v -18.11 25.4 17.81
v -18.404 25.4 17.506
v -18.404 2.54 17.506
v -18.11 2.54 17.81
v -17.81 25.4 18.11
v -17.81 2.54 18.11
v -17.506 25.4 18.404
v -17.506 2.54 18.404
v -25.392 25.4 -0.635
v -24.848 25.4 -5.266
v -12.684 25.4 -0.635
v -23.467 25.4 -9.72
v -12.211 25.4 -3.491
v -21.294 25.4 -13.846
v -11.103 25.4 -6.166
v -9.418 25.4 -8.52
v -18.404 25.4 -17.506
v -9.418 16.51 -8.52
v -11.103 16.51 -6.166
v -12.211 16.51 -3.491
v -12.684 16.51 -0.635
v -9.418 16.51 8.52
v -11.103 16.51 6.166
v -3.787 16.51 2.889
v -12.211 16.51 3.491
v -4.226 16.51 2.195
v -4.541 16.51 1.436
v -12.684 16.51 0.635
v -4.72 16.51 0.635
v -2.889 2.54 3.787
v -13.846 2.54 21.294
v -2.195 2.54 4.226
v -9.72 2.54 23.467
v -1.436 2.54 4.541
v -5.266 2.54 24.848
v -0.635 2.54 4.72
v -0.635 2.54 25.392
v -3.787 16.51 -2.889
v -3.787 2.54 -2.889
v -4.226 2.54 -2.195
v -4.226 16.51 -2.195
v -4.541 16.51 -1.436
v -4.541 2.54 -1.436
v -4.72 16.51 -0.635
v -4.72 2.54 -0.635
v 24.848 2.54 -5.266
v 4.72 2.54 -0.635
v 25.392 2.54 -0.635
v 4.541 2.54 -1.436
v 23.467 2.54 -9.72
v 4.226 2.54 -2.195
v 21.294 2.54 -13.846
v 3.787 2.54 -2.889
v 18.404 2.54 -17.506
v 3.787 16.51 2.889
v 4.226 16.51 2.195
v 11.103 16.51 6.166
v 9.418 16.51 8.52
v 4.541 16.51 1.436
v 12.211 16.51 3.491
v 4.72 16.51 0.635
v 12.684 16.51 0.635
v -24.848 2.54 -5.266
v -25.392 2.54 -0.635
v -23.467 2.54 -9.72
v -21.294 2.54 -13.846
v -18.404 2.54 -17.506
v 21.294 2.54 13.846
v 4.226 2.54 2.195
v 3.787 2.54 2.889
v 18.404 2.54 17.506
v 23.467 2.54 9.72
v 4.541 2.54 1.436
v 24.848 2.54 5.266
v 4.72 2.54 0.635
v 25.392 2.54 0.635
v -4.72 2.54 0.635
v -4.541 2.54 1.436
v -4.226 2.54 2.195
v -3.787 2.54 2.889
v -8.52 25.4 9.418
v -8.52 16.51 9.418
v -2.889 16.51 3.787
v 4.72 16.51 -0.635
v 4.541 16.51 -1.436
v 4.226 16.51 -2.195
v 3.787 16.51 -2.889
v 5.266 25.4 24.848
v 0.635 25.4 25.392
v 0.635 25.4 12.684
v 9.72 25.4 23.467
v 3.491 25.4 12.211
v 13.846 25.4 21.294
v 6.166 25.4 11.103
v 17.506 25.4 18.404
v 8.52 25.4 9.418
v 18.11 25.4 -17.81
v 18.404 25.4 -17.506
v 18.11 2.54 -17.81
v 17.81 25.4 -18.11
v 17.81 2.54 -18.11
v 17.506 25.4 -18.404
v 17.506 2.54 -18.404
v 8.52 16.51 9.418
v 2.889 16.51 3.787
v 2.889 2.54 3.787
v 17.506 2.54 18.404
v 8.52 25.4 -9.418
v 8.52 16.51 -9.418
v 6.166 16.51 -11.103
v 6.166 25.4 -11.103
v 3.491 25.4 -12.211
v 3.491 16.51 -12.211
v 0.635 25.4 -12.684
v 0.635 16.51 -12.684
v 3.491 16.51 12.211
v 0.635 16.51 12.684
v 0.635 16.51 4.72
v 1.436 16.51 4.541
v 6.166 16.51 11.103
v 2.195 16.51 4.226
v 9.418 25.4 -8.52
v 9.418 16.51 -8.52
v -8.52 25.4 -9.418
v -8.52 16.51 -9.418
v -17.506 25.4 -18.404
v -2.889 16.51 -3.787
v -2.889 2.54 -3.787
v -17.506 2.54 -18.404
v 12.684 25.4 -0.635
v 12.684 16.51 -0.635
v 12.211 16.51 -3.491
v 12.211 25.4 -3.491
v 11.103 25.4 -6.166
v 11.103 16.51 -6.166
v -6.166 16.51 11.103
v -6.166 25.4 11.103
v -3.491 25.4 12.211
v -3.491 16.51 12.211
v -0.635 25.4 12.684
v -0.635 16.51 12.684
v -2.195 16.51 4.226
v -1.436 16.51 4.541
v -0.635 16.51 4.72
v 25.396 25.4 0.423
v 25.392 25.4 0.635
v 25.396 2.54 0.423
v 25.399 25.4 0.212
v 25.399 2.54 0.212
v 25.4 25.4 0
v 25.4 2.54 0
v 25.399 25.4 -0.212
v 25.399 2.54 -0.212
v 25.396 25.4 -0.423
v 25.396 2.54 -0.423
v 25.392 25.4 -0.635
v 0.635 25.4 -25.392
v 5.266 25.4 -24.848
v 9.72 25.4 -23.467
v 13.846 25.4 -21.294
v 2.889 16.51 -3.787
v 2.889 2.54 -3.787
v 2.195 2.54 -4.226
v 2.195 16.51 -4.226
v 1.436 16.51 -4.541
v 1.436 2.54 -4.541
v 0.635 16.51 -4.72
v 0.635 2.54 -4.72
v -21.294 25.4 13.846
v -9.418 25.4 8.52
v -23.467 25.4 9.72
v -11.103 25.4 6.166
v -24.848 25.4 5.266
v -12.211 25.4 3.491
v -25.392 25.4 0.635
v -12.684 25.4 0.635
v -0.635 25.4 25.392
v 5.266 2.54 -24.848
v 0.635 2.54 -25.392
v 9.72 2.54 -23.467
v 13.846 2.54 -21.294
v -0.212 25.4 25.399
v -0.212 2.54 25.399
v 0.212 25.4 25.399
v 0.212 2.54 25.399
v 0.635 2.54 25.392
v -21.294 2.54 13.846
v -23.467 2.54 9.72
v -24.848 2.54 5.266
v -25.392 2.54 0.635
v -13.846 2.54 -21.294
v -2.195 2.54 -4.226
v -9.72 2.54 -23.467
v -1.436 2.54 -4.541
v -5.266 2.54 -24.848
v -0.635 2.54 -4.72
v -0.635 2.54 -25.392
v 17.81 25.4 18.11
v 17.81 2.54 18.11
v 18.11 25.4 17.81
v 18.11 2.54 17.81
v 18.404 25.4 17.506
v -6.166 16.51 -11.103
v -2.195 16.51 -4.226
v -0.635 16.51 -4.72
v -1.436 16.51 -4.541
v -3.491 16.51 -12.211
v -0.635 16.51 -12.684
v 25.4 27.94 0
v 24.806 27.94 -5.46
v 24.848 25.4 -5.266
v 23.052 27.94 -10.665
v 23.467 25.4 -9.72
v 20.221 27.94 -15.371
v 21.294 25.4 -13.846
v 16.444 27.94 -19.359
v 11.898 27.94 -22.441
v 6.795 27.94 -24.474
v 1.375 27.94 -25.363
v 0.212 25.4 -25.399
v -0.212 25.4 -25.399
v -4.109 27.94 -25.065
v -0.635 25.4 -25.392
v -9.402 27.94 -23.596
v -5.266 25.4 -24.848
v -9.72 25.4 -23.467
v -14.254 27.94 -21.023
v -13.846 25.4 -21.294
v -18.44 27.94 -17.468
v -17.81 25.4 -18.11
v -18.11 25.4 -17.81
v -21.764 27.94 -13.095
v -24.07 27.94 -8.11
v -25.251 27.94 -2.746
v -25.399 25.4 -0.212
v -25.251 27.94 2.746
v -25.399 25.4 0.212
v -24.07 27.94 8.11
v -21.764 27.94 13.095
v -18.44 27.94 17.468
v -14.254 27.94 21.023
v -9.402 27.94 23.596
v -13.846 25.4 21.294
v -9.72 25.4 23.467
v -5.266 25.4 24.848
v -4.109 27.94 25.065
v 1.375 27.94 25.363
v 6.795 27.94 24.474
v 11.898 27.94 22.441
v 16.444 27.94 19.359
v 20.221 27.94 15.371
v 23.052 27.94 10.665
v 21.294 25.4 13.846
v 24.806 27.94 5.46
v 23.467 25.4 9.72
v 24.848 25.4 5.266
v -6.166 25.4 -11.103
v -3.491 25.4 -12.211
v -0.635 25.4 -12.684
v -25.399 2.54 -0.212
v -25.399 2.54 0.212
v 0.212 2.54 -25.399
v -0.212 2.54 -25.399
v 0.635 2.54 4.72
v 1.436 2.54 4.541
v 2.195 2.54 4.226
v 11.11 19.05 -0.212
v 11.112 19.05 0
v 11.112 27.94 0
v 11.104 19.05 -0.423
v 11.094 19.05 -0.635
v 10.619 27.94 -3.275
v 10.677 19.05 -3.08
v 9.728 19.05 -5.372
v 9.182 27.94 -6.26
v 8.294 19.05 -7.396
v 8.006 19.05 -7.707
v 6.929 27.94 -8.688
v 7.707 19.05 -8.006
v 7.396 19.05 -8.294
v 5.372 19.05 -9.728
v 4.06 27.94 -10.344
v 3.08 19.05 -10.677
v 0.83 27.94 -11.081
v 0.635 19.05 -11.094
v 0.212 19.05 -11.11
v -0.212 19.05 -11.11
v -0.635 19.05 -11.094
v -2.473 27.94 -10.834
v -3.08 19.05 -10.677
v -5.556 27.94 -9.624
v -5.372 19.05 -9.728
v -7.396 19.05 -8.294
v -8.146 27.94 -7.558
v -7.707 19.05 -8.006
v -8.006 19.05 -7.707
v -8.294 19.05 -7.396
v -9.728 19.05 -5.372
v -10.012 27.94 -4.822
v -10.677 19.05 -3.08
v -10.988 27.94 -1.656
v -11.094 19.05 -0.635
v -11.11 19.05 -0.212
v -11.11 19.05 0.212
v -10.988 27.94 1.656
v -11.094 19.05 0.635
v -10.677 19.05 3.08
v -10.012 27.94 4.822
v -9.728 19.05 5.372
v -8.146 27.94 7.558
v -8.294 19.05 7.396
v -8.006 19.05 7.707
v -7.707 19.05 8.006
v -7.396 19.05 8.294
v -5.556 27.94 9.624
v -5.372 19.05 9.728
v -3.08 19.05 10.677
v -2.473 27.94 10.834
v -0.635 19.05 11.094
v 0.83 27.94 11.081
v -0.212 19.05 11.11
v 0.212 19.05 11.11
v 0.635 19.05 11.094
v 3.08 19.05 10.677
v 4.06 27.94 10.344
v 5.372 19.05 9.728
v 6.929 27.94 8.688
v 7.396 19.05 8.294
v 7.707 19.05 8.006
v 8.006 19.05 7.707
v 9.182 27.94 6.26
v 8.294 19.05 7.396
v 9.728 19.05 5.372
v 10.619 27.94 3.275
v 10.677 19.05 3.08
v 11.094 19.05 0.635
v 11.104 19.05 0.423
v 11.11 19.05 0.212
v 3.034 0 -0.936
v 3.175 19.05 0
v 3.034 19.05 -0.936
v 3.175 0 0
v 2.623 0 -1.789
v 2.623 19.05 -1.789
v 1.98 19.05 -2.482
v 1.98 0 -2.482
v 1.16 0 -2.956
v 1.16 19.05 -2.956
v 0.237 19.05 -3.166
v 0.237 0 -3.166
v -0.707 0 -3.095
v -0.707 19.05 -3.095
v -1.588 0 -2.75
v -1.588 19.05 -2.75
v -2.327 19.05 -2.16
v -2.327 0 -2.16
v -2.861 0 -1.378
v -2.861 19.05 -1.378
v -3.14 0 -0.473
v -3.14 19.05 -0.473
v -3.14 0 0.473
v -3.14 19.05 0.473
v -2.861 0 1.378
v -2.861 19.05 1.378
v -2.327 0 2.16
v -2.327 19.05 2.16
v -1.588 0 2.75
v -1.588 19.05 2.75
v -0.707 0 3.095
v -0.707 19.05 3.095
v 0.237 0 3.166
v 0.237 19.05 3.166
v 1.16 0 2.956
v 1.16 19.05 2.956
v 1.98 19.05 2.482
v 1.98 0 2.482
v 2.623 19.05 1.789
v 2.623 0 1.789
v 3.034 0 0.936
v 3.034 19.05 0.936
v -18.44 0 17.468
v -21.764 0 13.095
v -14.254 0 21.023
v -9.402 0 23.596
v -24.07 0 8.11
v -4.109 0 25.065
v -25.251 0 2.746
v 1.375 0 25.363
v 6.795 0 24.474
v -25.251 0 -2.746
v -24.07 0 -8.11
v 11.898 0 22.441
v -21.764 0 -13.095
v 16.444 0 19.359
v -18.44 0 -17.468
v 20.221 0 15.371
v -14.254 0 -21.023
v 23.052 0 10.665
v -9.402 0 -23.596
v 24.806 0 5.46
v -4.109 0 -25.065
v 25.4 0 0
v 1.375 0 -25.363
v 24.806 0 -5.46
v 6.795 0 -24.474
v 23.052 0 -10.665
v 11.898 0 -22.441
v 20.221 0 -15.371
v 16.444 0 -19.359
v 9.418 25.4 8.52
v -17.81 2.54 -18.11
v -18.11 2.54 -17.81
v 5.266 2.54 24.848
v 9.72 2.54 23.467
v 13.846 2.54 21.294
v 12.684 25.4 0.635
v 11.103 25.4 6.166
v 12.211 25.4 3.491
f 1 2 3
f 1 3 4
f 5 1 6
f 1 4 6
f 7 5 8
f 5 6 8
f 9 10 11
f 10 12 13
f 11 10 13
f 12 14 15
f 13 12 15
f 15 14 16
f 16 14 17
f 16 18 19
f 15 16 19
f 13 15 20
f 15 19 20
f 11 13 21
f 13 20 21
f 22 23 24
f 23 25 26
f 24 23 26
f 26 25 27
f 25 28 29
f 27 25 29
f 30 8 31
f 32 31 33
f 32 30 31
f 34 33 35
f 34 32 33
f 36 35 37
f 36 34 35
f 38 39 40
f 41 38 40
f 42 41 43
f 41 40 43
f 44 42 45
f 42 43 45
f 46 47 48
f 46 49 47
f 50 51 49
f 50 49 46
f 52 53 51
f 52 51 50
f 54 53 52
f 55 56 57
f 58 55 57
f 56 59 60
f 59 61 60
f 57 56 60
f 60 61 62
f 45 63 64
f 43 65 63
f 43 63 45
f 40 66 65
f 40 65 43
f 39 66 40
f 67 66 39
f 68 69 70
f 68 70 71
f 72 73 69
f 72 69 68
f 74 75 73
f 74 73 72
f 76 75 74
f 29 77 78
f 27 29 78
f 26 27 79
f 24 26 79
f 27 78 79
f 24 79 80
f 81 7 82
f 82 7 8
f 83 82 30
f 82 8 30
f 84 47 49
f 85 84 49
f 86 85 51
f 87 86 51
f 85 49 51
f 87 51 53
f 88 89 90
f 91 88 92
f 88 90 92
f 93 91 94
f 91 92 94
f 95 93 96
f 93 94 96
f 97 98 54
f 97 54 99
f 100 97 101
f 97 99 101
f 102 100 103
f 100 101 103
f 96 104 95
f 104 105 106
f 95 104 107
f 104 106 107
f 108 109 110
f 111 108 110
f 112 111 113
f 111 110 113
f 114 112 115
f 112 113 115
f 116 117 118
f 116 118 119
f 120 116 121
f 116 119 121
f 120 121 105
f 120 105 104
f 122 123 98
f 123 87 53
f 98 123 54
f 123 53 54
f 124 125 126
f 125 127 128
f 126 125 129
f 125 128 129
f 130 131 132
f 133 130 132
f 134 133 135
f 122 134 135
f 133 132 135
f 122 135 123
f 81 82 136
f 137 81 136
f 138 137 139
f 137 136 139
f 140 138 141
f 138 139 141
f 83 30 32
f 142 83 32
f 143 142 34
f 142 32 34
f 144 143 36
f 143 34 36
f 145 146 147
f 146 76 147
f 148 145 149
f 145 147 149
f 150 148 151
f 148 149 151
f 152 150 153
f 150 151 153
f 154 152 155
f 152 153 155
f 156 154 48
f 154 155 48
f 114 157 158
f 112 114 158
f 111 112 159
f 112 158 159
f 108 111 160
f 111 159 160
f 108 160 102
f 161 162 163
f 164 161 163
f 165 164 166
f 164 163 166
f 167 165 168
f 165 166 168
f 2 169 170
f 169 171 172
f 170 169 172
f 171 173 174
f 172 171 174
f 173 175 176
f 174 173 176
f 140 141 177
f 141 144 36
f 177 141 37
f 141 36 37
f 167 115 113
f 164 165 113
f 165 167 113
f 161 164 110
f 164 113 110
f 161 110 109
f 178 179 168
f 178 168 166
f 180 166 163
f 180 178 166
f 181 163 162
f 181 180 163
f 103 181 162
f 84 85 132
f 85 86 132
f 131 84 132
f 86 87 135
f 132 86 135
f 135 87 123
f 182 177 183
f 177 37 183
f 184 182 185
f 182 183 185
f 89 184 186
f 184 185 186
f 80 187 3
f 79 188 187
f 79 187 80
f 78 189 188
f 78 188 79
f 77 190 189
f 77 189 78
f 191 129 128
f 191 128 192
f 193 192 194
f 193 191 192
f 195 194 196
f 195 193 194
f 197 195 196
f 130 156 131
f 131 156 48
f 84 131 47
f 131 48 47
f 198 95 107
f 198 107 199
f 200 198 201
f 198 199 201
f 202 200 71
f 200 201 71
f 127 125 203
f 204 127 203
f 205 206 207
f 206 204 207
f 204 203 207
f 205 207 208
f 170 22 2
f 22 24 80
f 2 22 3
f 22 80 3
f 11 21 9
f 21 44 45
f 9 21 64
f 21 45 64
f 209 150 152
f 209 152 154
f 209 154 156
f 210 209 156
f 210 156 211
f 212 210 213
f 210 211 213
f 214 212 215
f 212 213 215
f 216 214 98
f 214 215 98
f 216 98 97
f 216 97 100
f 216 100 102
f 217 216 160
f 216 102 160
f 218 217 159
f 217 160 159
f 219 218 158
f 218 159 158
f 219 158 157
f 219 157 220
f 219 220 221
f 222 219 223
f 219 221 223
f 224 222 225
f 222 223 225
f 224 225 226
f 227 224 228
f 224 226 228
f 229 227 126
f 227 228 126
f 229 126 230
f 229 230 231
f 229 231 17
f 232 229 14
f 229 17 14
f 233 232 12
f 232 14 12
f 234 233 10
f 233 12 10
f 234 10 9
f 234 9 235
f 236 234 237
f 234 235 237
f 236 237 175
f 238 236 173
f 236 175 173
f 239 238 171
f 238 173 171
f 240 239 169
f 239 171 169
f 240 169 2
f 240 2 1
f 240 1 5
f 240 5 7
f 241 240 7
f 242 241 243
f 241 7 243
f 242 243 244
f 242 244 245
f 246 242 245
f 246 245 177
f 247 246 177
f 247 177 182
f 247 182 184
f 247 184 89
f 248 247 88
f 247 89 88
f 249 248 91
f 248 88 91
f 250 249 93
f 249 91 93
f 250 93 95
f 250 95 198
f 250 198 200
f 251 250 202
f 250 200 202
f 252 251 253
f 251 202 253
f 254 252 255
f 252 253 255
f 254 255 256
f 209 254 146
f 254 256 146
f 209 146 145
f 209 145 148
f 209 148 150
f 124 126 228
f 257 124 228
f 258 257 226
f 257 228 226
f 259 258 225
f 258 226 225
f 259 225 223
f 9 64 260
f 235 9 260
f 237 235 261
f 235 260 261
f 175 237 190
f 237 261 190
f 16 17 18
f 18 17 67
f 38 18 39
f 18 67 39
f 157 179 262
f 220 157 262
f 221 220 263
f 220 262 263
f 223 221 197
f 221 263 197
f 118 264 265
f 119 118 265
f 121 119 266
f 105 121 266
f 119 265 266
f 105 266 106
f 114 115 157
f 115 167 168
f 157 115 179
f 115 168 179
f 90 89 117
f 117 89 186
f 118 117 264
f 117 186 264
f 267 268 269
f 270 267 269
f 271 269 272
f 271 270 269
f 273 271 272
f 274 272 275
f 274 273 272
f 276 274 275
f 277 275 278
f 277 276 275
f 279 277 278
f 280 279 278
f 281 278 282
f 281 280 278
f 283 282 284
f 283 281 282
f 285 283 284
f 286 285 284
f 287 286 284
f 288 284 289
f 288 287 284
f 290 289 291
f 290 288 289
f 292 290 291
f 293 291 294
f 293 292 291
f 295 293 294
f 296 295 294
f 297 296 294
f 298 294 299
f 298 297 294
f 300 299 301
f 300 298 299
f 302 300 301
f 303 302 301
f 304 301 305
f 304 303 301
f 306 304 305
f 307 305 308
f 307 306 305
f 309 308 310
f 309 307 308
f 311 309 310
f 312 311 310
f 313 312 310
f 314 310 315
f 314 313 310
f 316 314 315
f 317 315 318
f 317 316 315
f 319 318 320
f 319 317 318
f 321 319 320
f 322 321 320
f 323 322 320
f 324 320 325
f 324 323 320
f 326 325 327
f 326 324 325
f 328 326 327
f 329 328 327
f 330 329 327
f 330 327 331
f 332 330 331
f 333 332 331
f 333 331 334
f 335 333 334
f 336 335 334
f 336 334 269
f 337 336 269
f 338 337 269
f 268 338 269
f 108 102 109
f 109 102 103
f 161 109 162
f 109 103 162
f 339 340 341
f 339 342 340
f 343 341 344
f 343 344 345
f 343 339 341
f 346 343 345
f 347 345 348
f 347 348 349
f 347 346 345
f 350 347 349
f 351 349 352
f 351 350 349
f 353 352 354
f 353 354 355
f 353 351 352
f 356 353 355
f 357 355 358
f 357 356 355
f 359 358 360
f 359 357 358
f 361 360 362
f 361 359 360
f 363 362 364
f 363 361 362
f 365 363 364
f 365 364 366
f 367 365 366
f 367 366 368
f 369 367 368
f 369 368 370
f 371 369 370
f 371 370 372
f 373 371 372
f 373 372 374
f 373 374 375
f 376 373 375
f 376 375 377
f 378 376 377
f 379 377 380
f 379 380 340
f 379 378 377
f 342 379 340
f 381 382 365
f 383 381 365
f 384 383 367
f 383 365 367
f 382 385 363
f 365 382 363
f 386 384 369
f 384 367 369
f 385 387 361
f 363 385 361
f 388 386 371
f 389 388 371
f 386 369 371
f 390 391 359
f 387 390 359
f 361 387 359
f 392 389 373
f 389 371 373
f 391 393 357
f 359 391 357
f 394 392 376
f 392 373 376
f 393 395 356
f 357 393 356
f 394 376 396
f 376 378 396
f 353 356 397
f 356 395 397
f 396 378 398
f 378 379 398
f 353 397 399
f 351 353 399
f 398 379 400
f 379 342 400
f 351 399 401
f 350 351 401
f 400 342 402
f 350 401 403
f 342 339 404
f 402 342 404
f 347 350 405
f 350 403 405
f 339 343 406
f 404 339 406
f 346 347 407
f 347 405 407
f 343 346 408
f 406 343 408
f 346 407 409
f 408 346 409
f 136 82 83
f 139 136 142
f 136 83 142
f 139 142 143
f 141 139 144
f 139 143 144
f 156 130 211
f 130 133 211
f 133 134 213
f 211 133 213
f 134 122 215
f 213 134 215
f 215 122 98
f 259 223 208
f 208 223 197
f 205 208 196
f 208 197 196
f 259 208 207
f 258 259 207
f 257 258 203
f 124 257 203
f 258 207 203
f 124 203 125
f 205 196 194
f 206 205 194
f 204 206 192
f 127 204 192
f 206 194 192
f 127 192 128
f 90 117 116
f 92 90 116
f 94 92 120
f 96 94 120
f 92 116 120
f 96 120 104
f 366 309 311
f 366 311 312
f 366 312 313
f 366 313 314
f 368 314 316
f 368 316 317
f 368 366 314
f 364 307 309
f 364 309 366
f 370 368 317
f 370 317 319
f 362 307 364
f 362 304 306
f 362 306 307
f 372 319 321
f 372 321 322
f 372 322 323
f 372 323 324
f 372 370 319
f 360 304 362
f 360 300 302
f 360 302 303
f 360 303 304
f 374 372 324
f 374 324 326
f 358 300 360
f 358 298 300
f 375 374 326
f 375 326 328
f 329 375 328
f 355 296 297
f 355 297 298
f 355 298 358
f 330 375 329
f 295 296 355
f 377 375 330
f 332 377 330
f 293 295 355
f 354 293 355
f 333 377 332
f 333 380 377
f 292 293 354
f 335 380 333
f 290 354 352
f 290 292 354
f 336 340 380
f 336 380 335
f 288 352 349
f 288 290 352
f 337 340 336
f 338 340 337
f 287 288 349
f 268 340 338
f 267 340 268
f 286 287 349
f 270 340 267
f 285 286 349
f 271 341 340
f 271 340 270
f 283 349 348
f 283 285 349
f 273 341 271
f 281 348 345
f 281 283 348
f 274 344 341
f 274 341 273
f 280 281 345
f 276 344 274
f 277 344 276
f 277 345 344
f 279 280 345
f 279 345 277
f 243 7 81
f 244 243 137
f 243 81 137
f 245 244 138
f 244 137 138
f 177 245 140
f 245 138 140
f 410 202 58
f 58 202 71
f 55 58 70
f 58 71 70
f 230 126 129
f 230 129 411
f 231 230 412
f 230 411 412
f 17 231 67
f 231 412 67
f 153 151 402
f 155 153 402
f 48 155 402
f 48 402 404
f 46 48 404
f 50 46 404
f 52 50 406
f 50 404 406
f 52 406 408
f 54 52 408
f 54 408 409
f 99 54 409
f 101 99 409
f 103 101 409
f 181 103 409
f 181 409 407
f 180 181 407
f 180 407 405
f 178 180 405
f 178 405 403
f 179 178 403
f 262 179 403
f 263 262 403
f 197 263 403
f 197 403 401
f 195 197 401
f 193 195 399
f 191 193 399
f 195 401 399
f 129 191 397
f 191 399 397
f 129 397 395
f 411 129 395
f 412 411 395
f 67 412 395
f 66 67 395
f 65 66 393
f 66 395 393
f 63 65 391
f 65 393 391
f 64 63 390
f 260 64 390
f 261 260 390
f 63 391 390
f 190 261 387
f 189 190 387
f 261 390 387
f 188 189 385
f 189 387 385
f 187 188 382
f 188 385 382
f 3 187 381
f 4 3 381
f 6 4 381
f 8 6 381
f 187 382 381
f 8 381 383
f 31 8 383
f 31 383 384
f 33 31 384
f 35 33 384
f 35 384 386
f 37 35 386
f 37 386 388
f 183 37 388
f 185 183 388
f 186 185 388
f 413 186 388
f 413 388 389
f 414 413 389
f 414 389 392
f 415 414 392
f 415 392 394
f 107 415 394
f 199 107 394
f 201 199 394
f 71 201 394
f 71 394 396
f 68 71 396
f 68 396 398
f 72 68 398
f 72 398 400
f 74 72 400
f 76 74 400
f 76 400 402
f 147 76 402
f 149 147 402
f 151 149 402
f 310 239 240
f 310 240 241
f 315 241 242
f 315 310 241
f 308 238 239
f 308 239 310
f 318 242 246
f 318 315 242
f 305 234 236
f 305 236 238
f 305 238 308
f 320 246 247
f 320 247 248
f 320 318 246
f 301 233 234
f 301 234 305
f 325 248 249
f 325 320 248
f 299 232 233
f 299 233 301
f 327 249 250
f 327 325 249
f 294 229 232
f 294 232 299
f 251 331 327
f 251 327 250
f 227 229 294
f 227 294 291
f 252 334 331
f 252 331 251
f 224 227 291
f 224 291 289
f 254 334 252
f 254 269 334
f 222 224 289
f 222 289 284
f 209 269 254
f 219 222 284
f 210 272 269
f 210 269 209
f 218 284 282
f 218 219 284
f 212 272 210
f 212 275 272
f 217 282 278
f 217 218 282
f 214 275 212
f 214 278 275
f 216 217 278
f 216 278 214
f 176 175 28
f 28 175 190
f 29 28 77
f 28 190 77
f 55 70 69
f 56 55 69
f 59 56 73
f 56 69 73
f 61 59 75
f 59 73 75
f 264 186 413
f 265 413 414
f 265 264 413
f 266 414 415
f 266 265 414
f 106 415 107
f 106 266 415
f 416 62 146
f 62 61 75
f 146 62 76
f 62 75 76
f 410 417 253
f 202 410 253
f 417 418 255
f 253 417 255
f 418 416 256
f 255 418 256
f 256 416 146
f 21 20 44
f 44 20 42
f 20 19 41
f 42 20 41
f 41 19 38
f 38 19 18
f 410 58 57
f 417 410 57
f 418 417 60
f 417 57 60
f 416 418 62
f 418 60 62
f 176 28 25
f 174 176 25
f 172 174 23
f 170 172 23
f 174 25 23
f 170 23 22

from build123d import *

# Parameters (mm, degrees)
SKETCH1_R           = 25.4
SKETCH1_R_2         = 3.175
BOSS_EXTRUDE1_DEPTH = 2.54
SKETCH2_R           = 3.175
BOSS_EXTRUDE4_DEPTH = 13.97
SKETCH5_R           = 11.1125
SKETCH5_R_2         = 3.175
BOSS_EXTRUDE6_DEPTH = 2.54
SKETCH5_4_R         = 11.1125
BOSS_EXTRUDE7_DEPTH = 8.89
SKETCH6_R           = 25.4
SKETCH6_R_2         = 11.1125
BOSS_EXTRUDE8_DEPTH = 2.54


with BuildPart() as part:
    # Sketch1 → Boss-Extrude1 (new body)
    with BuildSketch(Plane(origin=(0, 0, 0), x_dir=(1, 0, 0), z_dir=(0, 1, 0))):
        Circle(SKETCH1_R)
        Circle(SKETCH1_R_2, mode=Mode.SUBTRACT)
    extrude(amount=BOSS_EXTRUDE1_DEPTH)

    # Sketch2 → Boss-Extrude4 (add)
    with BuildSketch(Plane(origin=(0, 2.54, 0), x_dir=(1, 0, 0), z_dir=(0, 1, 0))):
        with BuildLine():
            ThreePointArc((0.635, 25.392061259), (0, 25.4), (-0.635, 25.392061259))
            Line((-0.635, 25.392061259), (-0.635, 4.719976827))
            ThreePointArc((-0.635, 4.719976827), (-1.822529847, 4.399976274), (-2.888514816, 3.786540428))
            Line((-2.888514816, 3.786540428), (-17.505885899, 18.403911511))
            ThreePointArc((-17.505885899, 18.403911511), (-17.960512242, 17.960512242), (-18.403911511, 17.505885899))
            Line((-18.403911511, 17.505885899), (-3.786540428, 2.888514816))
            ThreePointArc((-3.786540428, 2.888514816), (-4.399976274, 1.822529847), (-4.719976827, 0.635))
            Line((-4.719976827, 0.635), (-25.392061259, 0.635))
            ThreePointArc((-25.392061259, 0.635), (-25.4, 0), (-25.392061259, -0.635))
            Line((-25.392061259, -0.635), (-4.719976827, -0.635))
            ThreePointArc((-4.719976827, -0.635), (-4.399976274, -1.822529847), (-3.786540428, -2.888514816))
            Line((-3.786540428, -2.888514816), (-18.403911511, -17.505885899))
            ThreePointArc((-18.403911511, -17.505885899), (-17.960512242, -17.960512242), (-17.505885899, -18.403911511))
            Line((-17.505885899, -18.403911511), (-2.888514816, -3.786540428))
            ThreePointArc((-2.888514816, -3.786540428), (-1.822529847, -4.399976274), (-0.635, -4.719976827))
            Line((-0.635, -4.719976827), (-0.635, -25.392061259))
            ThreePointArc((-0.635, -25.392061259), (0, -25.4), (0.635, -25.392061259))
            Line((0.635, -25.392061259), (0.635, -4.719976827))
            ThreePointArc((0.635, -4.719976827), (1.822529847, -4.399976274), (2.888514816, -3.786540428))
            Line((2.888514816, -3.786540428), (17.505885899, -18.403911511))
            ThreePointArc((17.505885899, -18.403911511), (17.960512242, -17.960512242), (18.403911511, -17.505885899))
            Line((18.403911511, -17.505885899), (3.786540428, -2.888514816))
            ThreePointArc((3.786540428, -2.888514816), (4.399976274, -1.822529847), (4.719976827, -0.635))
            Line((4.719976827, -0.635), (25.392061259, -0.635))
            ThreePointArc((25.392061259, -0.635), (25.4, 0), (25.392061259, 0.635))
            Line((25.392061259, 0.635), (4.719976827, 0.635))
            ThreePointArc((4.719976827, 0.635), (4.399976274, 1.822529847), (3.786540428, 2.888514816))
            Line((3.786540428, 2.888514816), (18.403911511, 17.505885899))
            ThreePointArc((18.403911511, 17.505885899), (17.960512242, 17.960512242), (17.505885899, 18.403911511))
            Line((17.505885899, 18.403911511), (2.888514816, 3.786540428))
            ThreePointArc((2.888514816, 3.786540428), (1.822529847, 4.399976274), (0.635, 4.719976827))
            Line((0.635, 4.719976827), (0.635, 25.392061259))
        make_face()
        Circle(SKETCH2_R, mode=Mode.SUBTRACT)
    extrude(amount=BOSS_EXTRUDE4_DEPTH)

    # Sketch5 → Boss-Extrude6 (add)
    with BuildSketch(Plane(origin=(0, 16.51, 0), x_dir=(1, 0, 0), z_dir=(0, 1, 0))):
        Circle(SKETCH5_R)
        Circle(SKETCH5_R_2, mode=Mode.SUBTRACT)
    extrude(amount=BOSS_EXTRUDE6_DEPTH)

    # Sketch5<4> → Boss-Extrude7 (add)
    with BuildSketch(Plane(origin=(0, 16.51, 0), x_dir=(1, 0, 0), z_dir=(0, 1, 0))):
        with BuildLine():
            ThreePointArc((0.635, -12.684115066), (4.860079591, -11.733270063), (8.52001097, -9.418036582))
            Line((8.52001097, -9.418036582), (17.505885899, -18.403911511))
            ThreePointArc((17.505885899, -18.403911511), (17.960512242, -17.960512242), (18.403911511, -17.505885899))
            Line((18.403911511, -17.505885899), (9.418036582, -8.52001097))
            ThreePointArc((9.418036582, -8.52001097), (11.733270063, -4.860079591), (12.684115066, -0.635))
            Line((12.684115066, -0.635), (25.392061259, -0.635))
            ThreePointArc((25.392061259, -0.635), (25.4, 0), (25.392061259, 0.635))
            Line((25.392061259, 0.635), (12.684115066, 0.635))
            ThreePointArc((12.684115066, 0.635), (11.733270063, 4.860079591), (9.418036582, 8.52001097))
            Line((9.418036582, 8.52001097), (18.403911511, 17.505885899))
            ThreePointArc((18.403911511, 17.505885899), (17.960512242, 17.960512242), (17.505885899, 18.403911511))
            Line((17.505885899, 18.403911511), (8.52001097, 9.418036582))
            ThreePointArc((8.52001097, 9.418036582), (4.860079591, 11.733270063), (0.635, 12.684115066))
            Line((0.635, 12.684115066), (0.635, 25.392061259))
            ThreePointArc((0.635, 25.392061259), (0, 25.4), (-0.635, 25.392061259))
            Line((-0.635, 25.392061259), (-0.635, 12.684115066))
            ThreePointArc((-0.635, 12.684115066), (-4.860079591, 11.733270063), (-8.52001097, 9.418036582))
            Line((-8.52001097, 9.418036582), (-17.505885899, 18.403911511))
            ThreePointArc((-17.505885899, 18.403911511), (-17.960512242, 17.960512242), (-18.403911511, 17.505885899))
            Line((-18.403911511, 17.505885899), (-9.418036582, 8.52001097))
            ThreePointArc((-9.418036582, 8.52001097), (-11.733270063, 4.860079591), (-12.684115066, 0.635))
            Line((-12.684115066, 0.635), (-25.392061259, 0.635))
            ThreePointArc((-25.392061259, 0.635), (-25.4, 0), (-25.392061259, -0.635))
            Line((-25.392061259, -0.635), (-12.684115066, -0.635))
            ThreePointArc((-12.684115066, -0.635), (-11.733270063, -4.860079591), (-9.418036582, -8.52001097))
            Line((-9.418036582, -8.52001097), (-18.403911511, -17.505885899))
            ThreePointArc((-18.403911511, -17.505885899), (-17.960512242, -17.960512242), (-17.505885899, -18.403911511))
            Line((-17.505885899, -18.403911511), (-8.52001097, -9.418036582))
            ThreePointArc((-8.52001097, -9.418036582), (-4.860079591, -11.733270063), (-0.635, -12.684115066))
            Line((-0.635, -12.684115066), (-0.635, -25.392061259))
            ThreePointArc((-0.635, -25.392061259), (0, -25.4), (0.635, -25.392061259))
            Line((0.635, -25.392061259), (0.635, -12.684115066))
        make_face()
        Circle(SKETCH5_4_R, mode=Mode.SUBTRACT)
    extrude(amount=BOSS_EXTRUDE7_DEPTH)

    # Sketch6 → Boss-Extrude8 (add)
    with BuildSketch(Plane(origin=(0, 25.4, 0), x_dir=(1, 0, 0), z_dir=(0, 1, 0))):
        Circle(SKETCH6_R)
        Circle(SKETCH6_R_2, mode=Mode.SUBTRACT)
    extrude(amount=BOSS_EXTRUDE8_DEPTH)


solid = part.part
